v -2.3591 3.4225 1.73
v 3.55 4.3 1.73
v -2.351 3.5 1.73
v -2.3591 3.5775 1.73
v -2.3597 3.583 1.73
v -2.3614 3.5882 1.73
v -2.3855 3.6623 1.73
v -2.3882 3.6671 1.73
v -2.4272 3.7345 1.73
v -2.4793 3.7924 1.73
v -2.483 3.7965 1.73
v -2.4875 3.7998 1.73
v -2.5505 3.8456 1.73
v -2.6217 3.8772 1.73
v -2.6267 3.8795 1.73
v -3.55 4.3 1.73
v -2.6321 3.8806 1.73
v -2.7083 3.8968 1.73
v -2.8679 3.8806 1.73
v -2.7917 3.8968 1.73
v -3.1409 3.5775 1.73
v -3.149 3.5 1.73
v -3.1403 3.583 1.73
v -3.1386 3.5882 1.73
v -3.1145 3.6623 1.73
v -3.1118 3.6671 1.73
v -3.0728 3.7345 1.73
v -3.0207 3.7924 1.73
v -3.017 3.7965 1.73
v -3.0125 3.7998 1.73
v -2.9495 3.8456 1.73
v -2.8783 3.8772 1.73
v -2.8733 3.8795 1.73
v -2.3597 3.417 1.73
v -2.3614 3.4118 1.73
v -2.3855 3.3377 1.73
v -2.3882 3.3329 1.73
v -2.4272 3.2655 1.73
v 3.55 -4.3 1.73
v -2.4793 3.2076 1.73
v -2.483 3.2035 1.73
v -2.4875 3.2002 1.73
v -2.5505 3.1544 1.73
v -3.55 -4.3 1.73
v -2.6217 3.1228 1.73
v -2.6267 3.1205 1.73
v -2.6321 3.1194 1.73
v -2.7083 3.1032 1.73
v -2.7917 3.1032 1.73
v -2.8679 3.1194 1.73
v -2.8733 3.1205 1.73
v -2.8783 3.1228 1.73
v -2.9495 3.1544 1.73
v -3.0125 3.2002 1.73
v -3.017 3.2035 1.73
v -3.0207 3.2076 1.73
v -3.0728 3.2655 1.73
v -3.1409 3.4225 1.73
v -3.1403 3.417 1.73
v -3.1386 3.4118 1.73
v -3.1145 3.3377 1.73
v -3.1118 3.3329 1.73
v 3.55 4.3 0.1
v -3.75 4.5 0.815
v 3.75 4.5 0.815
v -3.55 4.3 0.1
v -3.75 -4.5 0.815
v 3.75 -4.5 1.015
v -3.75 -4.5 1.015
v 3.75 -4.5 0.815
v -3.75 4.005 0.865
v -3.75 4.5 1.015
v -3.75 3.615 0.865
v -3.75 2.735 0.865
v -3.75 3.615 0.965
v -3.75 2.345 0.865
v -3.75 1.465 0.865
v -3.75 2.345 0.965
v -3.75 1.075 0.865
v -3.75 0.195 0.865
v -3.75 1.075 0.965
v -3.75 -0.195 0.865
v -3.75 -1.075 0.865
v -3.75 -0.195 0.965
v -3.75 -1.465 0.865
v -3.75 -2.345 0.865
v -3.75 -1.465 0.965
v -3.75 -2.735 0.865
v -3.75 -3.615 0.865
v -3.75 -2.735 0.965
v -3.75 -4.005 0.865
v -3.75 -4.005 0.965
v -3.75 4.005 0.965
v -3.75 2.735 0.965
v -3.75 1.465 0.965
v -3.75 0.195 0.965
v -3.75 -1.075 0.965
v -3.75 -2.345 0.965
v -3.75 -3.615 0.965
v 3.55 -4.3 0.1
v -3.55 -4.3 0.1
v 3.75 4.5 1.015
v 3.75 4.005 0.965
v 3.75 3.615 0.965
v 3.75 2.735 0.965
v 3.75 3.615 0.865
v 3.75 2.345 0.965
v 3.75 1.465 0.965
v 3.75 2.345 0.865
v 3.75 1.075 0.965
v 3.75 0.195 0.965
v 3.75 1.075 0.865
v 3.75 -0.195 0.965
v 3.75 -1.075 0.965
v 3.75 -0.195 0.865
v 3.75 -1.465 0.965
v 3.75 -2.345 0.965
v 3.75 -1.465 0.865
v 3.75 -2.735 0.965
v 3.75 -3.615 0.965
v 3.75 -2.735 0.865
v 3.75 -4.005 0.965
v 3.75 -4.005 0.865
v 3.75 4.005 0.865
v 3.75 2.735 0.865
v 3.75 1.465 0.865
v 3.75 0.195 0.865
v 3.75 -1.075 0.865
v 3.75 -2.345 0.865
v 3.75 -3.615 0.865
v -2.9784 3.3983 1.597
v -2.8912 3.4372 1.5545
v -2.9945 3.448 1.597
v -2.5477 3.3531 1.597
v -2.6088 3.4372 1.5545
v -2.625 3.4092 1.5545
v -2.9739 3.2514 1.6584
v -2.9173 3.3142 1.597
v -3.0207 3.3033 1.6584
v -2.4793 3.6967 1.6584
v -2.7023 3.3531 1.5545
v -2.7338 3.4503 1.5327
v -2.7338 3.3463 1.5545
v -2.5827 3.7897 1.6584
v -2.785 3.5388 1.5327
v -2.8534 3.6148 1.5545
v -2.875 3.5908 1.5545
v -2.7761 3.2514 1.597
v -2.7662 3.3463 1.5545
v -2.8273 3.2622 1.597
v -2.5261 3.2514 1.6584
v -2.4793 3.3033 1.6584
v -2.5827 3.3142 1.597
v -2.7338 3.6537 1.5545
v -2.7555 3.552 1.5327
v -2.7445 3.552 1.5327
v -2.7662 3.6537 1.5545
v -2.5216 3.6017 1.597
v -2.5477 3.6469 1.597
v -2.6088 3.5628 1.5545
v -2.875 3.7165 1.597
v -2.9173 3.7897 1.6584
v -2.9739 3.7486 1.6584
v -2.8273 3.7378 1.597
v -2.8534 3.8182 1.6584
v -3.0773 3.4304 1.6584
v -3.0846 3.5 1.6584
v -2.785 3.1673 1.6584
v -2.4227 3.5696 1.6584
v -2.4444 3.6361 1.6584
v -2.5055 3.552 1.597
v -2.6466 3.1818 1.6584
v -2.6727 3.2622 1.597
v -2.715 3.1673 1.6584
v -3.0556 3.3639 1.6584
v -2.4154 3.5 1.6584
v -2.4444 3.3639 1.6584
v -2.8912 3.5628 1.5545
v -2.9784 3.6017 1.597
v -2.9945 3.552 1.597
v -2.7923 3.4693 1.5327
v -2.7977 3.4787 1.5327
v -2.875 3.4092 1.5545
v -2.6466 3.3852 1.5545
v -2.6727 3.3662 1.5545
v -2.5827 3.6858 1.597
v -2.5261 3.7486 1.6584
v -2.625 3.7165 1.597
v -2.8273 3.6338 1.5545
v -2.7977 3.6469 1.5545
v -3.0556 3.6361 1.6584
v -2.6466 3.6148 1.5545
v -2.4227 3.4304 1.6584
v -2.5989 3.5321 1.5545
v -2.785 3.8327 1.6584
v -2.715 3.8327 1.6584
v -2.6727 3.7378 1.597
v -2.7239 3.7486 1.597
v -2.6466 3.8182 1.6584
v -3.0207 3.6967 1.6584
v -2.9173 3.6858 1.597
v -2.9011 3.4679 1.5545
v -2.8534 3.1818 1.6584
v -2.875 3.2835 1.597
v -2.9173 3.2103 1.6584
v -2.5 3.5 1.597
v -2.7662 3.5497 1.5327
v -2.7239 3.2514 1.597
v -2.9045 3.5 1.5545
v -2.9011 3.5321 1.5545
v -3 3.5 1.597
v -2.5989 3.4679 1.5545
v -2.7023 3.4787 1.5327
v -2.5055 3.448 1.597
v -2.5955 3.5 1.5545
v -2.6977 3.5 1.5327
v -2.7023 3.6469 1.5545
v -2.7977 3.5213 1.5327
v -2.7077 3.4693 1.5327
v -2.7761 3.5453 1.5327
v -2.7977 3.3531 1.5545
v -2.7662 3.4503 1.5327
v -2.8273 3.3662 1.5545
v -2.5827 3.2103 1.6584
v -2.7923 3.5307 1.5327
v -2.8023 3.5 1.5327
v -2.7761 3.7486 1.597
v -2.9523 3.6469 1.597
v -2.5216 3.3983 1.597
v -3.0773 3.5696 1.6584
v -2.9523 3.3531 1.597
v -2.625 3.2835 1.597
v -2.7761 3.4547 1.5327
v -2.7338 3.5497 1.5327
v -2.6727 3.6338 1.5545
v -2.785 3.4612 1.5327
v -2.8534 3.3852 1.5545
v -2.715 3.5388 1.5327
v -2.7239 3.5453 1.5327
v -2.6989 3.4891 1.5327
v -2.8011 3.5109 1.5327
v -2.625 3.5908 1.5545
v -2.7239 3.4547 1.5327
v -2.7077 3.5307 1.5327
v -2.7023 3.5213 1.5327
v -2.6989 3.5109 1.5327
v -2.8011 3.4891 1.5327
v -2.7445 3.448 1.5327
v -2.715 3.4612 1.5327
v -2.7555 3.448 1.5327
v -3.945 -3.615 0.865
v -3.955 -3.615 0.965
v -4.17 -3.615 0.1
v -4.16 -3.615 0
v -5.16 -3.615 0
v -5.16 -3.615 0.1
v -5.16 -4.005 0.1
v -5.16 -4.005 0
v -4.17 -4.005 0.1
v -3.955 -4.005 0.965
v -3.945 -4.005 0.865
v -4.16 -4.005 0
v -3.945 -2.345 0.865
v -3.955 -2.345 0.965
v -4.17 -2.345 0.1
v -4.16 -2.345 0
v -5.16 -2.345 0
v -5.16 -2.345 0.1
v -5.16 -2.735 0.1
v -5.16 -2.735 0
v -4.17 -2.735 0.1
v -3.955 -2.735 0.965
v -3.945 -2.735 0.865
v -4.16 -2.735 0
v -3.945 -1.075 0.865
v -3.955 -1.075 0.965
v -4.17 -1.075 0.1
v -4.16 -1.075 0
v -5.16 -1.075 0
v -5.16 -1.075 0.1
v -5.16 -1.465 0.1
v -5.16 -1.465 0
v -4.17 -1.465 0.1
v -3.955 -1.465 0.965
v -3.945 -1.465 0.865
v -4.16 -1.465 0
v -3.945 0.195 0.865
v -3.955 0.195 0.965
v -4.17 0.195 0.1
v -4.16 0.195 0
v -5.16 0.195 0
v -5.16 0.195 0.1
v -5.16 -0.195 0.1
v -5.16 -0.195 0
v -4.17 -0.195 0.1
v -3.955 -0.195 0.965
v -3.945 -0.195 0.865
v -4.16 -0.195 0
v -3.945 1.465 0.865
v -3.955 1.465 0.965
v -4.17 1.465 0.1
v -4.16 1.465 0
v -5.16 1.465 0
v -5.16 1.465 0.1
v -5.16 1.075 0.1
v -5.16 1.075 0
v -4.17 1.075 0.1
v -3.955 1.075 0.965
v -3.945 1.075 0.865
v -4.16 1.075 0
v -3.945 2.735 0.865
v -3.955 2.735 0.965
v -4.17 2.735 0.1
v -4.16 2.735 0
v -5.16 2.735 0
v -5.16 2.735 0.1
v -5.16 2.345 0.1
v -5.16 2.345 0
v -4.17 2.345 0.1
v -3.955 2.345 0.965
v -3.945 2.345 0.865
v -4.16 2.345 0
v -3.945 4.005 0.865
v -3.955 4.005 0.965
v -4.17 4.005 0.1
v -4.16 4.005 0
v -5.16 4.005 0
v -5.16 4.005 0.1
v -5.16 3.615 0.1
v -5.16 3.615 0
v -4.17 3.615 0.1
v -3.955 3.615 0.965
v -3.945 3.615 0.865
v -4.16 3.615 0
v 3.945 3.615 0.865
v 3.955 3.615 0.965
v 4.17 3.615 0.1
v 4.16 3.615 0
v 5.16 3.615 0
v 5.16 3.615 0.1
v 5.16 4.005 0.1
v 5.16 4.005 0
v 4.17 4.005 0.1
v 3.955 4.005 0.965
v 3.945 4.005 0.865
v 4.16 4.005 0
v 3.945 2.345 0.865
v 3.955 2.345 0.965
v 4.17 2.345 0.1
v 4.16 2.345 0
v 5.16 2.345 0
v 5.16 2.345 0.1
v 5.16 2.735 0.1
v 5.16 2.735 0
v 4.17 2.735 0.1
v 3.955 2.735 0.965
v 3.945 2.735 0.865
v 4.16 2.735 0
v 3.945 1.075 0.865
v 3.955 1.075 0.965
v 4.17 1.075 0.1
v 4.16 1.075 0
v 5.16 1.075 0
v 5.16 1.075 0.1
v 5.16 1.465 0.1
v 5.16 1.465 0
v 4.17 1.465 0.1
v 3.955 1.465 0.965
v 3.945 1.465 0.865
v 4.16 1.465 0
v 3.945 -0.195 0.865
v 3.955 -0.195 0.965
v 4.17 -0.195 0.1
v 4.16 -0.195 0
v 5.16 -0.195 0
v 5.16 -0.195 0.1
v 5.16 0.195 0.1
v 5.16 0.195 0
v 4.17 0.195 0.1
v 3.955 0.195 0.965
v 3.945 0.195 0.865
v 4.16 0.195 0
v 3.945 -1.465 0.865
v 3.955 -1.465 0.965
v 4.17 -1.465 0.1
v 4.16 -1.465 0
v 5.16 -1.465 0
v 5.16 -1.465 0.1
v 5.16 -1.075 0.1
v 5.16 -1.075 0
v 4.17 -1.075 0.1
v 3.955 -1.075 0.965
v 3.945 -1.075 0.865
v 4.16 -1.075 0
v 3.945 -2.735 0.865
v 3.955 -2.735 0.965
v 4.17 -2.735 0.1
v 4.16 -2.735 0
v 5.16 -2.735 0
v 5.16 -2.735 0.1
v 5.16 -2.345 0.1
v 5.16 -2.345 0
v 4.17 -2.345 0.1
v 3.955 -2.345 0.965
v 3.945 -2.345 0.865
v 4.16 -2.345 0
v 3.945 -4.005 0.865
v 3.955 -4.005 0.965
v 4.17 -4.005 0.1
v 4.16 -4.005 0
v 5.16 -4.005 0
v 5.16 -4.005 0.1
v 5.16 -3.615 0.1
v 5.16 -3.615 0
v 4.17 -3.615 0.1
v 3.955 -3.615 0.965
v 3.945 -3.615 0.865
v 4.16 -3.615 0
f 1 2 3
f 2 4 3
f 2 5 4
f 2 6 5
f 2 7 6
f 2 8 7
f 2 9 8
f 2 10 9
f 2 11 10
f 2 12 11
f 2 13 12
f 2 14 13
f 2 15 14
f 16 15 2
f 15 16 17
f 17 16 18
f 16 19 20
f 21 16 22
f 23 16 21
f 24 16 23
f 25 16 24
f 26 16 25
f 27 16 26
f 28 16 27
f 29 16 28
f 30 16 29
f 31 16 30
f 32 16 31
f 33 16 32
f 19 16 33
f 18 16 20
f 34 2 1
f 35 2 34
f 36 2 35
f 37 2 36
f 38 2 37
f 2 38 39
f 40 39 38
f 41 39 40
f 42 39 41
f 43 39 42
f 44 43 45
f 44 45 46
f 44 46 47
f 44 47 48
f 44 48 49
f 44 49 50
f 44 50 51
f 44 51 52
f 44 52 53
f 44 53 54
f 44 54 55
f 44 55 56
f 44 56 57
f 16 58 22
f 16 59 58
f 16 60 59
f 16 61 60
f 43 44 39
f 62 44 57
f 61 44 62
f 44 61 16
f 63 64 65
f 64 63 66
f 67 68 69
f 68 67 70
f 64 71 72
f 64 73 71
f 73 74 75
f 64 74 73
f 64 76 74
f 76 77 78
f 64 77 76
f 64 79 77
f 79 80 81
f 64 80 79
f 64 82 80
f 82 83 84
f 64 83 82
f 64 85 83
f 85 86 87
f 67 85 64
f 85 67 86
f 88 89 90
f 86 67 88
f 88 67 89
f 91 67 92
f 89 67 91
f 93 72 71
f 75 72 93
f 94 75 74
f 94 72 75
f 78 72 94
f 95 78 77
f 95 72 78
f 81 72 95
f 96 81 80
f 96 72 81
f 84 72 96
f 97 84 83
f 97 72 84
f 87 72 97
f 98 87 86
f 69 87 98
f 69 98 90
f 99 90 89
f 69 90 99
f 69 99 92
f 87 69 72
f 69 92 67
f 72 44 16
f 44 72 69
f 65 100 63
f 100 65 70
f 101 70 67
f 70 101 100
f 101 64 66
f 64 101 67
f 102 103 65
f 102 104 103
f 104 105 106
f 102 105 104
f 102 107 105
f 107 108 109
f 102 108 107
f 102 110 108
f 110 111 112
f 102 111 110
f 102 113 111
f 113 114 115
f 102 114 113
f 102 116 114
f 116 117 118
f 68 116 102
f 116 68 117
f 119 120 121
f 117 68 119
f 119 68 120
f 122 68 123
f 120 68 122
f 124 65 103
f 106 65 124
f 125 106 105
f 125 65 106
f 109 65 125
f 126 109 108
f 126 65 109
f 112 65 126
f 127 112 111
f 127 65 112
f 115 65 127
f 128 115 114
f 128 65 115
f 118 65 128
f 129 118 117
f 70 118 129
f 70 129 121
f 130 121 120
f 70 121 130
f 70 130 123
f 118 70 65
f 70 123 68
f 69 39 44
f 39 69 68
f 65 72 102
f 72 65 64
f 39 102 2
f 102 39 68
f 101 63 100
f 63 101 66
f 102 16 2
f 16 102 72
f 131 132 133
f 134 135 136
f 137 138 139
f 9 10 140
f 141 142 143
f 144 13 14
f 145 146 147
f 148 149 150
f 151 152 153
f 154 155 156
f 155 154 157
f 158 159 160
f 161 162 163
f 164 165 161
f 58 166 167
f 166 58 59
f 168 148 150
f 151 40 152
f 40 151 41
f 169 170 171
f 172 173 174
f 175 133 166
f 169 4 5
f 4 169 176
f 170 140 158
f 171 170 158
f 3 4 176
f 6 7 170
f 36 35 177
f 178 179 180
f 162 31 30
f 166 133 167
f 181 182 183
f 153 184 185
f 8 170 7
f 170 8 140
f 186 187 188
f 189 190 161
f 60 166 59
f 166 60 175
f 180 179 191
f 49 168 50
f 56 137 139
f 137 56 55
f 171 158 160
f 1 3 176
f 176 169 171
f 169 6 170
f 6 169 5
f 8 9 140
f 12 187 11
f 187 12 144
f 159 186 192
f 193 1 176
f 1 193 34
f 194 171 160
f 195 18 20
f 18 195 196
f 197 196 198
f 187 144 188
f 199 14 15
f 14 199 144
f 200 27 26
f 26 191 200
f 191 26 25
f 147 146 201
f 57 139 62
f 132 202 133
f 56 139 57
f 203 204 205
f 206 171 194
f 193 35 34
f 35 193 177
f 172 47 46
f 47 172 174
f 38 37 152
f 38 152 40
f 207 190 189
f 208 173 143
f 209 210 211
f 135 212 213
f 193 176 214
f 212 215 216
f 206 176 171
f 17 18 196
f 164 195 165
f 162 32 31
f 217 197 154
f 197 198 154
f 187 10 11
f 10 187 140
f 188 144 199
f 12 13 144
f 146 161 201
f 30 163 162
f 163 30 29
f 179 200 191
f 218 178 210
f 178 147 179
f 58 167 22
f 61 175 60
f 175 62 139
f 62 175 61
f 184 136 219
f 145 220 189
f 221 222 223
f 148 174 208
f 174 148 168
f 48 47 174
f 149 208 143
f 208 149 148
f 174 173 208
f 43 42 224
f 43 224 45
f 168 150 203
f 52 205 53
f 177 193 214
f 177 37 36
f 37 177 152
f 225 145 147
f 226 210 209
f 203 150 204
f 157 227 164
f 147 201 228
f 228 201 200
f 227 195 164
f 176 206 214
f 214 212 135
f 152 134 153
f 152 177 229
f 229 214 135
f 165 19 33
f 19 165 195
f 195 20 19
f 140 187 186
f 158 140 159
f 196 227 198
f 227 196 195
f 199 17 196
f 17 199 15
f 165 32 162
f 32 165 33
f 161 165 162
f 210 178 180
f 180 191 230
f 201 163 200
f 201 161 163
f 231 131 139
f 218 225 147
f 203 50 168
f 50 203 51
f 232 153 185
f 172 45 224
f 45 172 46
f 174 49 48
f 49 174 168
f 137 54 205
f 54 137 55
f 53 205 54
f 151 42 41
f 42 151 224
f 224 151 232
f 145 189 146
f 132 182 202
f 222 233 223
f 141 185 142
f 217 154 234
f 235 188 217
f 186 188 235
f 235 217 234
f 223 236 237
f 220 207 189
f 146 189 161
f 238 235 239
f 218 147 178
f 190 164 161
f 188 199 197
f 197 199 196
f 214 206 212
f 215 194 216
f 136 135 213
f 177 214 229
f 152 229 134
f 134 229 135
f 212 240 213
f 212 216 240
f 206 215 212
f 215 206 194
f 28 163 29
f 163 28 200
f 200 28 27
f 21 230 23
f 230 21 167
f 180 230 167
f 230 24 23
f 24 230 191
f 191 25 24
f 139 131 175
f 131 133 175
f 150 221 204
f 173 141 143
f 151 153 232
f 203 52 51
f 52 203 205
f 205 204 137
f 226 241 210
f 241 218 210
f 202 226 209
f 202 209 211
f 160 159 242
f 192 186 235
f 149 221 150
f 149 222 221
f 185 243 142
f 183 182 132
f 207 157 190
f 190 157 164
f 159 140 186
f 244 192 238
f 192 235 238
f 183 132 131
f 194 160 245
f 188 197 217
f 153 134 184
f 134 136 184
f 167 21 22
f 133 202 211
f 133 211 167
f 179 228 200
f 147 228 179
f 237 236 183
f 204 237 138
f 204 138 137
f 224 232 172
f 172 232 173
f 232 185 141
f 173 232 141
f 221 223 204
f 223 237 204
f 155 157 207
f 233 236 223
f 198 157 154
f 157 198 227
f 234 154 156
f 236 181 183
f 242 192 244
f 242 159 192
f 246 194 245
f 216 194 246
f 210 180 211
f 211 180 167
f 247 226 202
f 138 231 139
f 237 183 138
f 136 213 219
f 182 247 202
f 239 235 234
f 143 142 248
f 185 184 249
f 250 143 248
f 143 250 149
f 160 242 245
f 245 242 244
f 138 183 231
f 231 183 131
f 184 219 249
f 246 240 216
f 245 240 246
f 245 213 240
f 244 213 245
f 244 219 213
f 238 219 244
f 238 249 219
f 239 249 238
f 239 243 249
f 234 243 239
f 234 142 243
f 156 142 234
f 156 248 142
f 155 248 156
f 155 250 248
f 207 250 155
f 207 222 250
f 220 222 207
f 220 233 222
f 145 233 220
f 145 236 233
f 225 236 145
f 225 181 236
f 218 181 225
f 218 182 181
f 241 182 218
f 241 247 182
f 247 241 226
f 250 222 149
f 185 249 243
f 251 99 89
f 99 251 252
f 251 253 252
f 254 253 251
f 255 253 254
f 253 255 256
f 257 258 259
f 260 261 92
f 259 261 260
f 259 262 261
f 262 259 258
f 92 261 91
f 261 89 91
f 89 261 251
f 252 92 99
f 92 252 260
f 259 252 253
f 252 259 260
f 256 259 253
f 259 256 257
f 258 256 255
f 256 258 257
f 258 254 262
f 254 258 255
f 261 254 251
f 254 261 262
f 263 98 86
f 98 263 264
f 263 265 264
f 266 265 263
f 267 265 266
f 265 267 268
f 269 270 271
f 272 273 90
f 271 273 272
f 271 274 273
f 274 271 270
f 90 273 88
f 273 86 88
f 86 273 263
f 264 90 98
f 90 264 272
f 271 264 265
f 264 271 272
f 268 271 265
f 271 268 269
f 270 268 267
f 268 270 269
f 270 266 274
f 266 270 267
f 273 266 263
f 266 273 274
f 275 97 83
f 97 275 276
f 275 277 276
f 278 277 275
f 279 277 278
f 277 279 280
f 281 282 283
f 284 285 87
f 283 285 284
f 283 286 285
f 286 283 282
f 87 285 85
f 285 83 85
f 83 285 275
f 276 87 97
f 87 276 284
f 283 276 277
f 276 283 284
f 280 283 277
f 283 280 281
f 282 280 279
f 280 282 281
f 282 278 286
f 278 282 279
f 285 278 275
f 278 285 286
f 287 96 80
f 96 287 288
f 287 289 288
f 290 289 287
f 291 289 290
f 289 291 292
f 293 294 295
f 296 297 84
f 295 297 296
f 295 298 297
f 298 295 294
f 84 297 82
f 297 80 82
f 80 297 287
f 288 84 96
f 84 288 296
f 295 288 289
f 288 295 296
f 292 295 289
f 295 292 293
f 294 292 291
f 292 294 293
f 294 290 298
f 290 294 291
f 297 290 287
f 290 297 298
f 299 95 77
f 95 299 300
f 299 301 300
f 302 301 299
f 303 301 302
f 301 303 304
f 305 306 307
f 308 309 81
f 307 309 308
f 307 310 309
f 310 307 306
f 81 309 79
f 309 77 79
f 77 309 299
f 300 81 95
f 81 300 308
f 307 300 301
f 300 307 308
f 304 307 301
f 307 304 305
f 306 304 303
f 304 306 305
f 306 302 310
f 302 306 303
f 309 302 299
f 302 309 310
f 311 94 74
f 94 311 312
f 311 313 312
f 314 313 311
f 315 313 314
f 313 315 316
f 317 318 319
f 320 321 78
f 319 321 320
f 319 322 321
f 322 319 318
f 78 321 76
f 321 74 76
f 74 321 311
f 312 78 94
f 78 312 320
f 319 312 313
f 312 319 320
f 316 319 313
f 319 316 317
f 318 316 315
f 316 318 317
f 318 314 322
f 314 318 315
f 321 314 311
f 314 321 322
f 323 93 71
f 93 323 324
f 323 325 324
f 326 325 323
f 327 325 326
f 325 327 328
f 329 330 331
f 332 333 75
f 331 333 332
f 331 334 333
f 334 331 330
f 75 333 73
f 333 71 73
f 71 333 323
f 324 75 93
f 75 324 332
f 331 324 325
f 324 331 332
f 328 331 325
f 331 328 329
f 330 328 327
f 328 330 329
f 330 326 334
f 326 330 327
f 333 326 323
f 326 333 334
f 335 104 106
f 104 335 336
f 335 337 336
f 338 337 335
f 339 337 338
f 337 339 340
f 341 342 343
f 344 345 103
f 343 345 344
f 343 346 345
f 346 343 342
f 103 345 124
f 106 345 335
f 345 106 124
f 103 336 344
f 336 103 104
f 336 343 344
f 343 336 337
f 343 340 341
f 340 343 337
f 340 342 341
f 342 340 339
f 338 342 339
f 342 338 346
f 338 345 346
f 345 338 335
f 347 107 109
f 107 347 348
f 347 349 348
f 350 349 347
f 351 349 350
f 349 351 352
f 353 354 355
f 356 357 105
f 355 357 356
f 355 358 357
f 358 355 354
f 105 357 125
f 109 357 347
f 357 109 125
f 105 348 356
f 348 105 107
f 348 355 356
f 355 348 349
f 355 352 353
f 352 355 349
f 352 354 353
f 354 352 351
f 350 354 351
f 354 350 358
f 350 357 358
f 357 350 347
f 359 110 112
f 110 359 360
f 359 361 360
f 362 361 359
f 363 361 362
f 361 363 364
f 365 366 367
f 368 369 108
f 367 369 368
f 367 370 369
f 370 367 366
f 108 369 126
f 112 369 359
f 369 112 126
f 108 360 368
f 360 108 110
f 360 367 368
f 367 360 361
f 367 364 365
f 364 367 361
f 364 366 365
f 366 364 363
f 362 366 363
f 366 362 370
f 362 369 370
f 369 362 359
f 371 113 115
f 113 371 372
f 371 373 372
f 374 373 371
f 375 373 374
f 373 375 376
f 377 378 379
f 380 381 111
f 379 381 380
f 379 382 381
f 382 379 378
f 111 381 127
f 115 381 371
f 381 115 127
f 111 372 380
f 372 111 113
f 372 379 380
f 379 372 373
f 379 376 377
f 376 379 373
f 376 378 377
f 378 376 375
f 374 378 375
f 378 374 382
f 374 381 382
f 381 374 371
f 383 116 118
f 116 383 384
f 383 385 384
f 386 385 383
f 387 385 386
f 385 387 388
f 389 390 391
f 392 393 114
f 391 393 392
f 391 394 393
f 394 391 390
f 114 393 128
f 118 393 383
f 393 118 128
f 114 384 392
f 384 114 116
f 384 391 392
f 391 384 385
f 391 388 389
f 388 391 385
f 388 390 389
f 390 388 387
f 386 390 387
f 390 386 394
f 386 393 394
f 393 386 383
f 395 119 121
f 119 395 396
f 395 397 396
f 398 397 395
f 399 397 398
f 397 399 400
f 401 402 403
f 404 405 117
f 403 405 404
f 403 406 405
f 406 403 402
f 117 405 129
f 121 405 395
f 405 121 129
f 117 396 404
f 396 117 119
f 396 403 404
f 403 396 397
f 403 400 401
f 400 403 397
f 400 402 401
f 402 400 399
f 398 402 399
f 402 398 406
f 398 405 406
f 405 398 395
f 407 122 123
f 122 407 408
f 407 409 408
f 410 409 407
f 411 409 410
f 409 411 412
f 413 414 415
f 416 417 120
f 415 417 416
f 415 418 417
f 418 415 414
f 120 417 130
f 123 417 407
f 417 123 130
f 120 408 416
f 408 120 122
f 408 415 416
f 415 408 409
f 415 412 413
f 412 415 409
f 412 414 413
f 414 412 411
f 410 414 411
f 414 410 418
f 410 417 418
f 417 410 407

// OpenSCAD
// file: proto/soic.scad
/*
OpenSCAD Model:  Small Outline IC

  N  - number of pins
  L  - width, including pads
  P  - pitch
  W  - width of pad
  H  - total height
  T  - toe length
  A  - body width
  B  - body height
  K  - elevation
  padcolor - color of pads
  bodycolor - color of plastic body
  simple - 0 = realistic model, 1 = simplified model

*/

module soic(
	N=14,
	L=6.4,
	P=0.65,
	W=0.25,
	H=1.2,
	T=0.624,
	A=4.4,
	B=5,
	K=0.1,
	padcolor=[0.9,0.9,0.9],
	bodycolor=[0.2,0.2,0.2],
	simple=0
) {

	module soicpadblock(n)	{
		x=0.01;
		color(padcolor) for (i=[0:n-1]) {
			translate ([0,-(n-1)/2*P+i*P+W/2,0])  rotate(90,[1,0,0]) linear_extrude(height=W) polygon(
				[[0,0],[0,0.1],[T-x,0.1],[T+((L-A)/2-T)/2,(H-K)/2+0.05+K],[(L-A)/2+0.05,(H-K)/2+0.05+K],
				 [(L-A)/2+0.05,(H-K)/2-0.05+K],[T+((L-A)/2-T)/2+x,(H-K)/2-0.05+K],[T,0]]
			);
		}
	}

	color(bodycolor) {
		translate([0,0,(H-K)/2+K]) {
			difference() {
			if (simple) {
				cube([A,B,H-K],center=true);
			} else {
				polyhedron(
					[[-A/2+0.2,B/2-0.2,(H-K)/2],[A/2-0.2,B/2-0.2,(H-K)/2],[A/2-0.2,-B/2+0.2,(H-K)/2],[-A/2+0.2,-B/2+0.2,(H-K)/2],
					 [-A/2,B/2,0.1],[A/2,B/2,0.1],[A/2,-B/2,0.1],[-A/2,-B/2,0.1],
					 [-A/2,B/2,-0.1],[A/2,B/2,-0.1],[A/2,-B/2,-0.1],[-A/2,-B/2,-0.1],
					 [-A/2+0.2,B/2-0.2,-(H-K)/2],[A/2-0.2,B/2-0.2,-(H-K)/2],[A/2-0.2,-B/2+0.2,-(H-K)/2],[-A/2+0.2,-B/2+0.2,-(H-K)/2]],
					[
					[0,1,2],[2,3,0],[14,13,12],[12,15,14],
					[0,4,5],[5,1,0],[1,5,6],[6,2,1],[2,6,7],[7,3,2],[3,7,4],[4,0,3],
					[4,8,9],[9,5,4],[5,9,10],[10,6,5],[6,10,11],[11,7,6],[11,8,4],[4,7,11],
					[8,12,13],[13,9,8],[9,13,14],[14,10,9],[10,14,15],[15,11,10],[11,15,12],[12,8,11],
					]
				);
			}
			translate([-A/2+1,B/2-1,(H-K)/2+0.3]) sphere(r=0.5,$fn=30);
			}
		}
	}

	translate([-L/2,0,0]) soicpadblock(N/2);
	translate([L/2,0,0]) rotate(180,[0,0,1]) soicpadblock(N/2);
}
// main file
include <proto/soic.scad>

soic(
	N=14,
	L=10.32,
	P=1.27,
	W=0.39,
	H=1.73,
	T=1.0,
	A=7.5,
	B=9.0,
	K=0.1
);
